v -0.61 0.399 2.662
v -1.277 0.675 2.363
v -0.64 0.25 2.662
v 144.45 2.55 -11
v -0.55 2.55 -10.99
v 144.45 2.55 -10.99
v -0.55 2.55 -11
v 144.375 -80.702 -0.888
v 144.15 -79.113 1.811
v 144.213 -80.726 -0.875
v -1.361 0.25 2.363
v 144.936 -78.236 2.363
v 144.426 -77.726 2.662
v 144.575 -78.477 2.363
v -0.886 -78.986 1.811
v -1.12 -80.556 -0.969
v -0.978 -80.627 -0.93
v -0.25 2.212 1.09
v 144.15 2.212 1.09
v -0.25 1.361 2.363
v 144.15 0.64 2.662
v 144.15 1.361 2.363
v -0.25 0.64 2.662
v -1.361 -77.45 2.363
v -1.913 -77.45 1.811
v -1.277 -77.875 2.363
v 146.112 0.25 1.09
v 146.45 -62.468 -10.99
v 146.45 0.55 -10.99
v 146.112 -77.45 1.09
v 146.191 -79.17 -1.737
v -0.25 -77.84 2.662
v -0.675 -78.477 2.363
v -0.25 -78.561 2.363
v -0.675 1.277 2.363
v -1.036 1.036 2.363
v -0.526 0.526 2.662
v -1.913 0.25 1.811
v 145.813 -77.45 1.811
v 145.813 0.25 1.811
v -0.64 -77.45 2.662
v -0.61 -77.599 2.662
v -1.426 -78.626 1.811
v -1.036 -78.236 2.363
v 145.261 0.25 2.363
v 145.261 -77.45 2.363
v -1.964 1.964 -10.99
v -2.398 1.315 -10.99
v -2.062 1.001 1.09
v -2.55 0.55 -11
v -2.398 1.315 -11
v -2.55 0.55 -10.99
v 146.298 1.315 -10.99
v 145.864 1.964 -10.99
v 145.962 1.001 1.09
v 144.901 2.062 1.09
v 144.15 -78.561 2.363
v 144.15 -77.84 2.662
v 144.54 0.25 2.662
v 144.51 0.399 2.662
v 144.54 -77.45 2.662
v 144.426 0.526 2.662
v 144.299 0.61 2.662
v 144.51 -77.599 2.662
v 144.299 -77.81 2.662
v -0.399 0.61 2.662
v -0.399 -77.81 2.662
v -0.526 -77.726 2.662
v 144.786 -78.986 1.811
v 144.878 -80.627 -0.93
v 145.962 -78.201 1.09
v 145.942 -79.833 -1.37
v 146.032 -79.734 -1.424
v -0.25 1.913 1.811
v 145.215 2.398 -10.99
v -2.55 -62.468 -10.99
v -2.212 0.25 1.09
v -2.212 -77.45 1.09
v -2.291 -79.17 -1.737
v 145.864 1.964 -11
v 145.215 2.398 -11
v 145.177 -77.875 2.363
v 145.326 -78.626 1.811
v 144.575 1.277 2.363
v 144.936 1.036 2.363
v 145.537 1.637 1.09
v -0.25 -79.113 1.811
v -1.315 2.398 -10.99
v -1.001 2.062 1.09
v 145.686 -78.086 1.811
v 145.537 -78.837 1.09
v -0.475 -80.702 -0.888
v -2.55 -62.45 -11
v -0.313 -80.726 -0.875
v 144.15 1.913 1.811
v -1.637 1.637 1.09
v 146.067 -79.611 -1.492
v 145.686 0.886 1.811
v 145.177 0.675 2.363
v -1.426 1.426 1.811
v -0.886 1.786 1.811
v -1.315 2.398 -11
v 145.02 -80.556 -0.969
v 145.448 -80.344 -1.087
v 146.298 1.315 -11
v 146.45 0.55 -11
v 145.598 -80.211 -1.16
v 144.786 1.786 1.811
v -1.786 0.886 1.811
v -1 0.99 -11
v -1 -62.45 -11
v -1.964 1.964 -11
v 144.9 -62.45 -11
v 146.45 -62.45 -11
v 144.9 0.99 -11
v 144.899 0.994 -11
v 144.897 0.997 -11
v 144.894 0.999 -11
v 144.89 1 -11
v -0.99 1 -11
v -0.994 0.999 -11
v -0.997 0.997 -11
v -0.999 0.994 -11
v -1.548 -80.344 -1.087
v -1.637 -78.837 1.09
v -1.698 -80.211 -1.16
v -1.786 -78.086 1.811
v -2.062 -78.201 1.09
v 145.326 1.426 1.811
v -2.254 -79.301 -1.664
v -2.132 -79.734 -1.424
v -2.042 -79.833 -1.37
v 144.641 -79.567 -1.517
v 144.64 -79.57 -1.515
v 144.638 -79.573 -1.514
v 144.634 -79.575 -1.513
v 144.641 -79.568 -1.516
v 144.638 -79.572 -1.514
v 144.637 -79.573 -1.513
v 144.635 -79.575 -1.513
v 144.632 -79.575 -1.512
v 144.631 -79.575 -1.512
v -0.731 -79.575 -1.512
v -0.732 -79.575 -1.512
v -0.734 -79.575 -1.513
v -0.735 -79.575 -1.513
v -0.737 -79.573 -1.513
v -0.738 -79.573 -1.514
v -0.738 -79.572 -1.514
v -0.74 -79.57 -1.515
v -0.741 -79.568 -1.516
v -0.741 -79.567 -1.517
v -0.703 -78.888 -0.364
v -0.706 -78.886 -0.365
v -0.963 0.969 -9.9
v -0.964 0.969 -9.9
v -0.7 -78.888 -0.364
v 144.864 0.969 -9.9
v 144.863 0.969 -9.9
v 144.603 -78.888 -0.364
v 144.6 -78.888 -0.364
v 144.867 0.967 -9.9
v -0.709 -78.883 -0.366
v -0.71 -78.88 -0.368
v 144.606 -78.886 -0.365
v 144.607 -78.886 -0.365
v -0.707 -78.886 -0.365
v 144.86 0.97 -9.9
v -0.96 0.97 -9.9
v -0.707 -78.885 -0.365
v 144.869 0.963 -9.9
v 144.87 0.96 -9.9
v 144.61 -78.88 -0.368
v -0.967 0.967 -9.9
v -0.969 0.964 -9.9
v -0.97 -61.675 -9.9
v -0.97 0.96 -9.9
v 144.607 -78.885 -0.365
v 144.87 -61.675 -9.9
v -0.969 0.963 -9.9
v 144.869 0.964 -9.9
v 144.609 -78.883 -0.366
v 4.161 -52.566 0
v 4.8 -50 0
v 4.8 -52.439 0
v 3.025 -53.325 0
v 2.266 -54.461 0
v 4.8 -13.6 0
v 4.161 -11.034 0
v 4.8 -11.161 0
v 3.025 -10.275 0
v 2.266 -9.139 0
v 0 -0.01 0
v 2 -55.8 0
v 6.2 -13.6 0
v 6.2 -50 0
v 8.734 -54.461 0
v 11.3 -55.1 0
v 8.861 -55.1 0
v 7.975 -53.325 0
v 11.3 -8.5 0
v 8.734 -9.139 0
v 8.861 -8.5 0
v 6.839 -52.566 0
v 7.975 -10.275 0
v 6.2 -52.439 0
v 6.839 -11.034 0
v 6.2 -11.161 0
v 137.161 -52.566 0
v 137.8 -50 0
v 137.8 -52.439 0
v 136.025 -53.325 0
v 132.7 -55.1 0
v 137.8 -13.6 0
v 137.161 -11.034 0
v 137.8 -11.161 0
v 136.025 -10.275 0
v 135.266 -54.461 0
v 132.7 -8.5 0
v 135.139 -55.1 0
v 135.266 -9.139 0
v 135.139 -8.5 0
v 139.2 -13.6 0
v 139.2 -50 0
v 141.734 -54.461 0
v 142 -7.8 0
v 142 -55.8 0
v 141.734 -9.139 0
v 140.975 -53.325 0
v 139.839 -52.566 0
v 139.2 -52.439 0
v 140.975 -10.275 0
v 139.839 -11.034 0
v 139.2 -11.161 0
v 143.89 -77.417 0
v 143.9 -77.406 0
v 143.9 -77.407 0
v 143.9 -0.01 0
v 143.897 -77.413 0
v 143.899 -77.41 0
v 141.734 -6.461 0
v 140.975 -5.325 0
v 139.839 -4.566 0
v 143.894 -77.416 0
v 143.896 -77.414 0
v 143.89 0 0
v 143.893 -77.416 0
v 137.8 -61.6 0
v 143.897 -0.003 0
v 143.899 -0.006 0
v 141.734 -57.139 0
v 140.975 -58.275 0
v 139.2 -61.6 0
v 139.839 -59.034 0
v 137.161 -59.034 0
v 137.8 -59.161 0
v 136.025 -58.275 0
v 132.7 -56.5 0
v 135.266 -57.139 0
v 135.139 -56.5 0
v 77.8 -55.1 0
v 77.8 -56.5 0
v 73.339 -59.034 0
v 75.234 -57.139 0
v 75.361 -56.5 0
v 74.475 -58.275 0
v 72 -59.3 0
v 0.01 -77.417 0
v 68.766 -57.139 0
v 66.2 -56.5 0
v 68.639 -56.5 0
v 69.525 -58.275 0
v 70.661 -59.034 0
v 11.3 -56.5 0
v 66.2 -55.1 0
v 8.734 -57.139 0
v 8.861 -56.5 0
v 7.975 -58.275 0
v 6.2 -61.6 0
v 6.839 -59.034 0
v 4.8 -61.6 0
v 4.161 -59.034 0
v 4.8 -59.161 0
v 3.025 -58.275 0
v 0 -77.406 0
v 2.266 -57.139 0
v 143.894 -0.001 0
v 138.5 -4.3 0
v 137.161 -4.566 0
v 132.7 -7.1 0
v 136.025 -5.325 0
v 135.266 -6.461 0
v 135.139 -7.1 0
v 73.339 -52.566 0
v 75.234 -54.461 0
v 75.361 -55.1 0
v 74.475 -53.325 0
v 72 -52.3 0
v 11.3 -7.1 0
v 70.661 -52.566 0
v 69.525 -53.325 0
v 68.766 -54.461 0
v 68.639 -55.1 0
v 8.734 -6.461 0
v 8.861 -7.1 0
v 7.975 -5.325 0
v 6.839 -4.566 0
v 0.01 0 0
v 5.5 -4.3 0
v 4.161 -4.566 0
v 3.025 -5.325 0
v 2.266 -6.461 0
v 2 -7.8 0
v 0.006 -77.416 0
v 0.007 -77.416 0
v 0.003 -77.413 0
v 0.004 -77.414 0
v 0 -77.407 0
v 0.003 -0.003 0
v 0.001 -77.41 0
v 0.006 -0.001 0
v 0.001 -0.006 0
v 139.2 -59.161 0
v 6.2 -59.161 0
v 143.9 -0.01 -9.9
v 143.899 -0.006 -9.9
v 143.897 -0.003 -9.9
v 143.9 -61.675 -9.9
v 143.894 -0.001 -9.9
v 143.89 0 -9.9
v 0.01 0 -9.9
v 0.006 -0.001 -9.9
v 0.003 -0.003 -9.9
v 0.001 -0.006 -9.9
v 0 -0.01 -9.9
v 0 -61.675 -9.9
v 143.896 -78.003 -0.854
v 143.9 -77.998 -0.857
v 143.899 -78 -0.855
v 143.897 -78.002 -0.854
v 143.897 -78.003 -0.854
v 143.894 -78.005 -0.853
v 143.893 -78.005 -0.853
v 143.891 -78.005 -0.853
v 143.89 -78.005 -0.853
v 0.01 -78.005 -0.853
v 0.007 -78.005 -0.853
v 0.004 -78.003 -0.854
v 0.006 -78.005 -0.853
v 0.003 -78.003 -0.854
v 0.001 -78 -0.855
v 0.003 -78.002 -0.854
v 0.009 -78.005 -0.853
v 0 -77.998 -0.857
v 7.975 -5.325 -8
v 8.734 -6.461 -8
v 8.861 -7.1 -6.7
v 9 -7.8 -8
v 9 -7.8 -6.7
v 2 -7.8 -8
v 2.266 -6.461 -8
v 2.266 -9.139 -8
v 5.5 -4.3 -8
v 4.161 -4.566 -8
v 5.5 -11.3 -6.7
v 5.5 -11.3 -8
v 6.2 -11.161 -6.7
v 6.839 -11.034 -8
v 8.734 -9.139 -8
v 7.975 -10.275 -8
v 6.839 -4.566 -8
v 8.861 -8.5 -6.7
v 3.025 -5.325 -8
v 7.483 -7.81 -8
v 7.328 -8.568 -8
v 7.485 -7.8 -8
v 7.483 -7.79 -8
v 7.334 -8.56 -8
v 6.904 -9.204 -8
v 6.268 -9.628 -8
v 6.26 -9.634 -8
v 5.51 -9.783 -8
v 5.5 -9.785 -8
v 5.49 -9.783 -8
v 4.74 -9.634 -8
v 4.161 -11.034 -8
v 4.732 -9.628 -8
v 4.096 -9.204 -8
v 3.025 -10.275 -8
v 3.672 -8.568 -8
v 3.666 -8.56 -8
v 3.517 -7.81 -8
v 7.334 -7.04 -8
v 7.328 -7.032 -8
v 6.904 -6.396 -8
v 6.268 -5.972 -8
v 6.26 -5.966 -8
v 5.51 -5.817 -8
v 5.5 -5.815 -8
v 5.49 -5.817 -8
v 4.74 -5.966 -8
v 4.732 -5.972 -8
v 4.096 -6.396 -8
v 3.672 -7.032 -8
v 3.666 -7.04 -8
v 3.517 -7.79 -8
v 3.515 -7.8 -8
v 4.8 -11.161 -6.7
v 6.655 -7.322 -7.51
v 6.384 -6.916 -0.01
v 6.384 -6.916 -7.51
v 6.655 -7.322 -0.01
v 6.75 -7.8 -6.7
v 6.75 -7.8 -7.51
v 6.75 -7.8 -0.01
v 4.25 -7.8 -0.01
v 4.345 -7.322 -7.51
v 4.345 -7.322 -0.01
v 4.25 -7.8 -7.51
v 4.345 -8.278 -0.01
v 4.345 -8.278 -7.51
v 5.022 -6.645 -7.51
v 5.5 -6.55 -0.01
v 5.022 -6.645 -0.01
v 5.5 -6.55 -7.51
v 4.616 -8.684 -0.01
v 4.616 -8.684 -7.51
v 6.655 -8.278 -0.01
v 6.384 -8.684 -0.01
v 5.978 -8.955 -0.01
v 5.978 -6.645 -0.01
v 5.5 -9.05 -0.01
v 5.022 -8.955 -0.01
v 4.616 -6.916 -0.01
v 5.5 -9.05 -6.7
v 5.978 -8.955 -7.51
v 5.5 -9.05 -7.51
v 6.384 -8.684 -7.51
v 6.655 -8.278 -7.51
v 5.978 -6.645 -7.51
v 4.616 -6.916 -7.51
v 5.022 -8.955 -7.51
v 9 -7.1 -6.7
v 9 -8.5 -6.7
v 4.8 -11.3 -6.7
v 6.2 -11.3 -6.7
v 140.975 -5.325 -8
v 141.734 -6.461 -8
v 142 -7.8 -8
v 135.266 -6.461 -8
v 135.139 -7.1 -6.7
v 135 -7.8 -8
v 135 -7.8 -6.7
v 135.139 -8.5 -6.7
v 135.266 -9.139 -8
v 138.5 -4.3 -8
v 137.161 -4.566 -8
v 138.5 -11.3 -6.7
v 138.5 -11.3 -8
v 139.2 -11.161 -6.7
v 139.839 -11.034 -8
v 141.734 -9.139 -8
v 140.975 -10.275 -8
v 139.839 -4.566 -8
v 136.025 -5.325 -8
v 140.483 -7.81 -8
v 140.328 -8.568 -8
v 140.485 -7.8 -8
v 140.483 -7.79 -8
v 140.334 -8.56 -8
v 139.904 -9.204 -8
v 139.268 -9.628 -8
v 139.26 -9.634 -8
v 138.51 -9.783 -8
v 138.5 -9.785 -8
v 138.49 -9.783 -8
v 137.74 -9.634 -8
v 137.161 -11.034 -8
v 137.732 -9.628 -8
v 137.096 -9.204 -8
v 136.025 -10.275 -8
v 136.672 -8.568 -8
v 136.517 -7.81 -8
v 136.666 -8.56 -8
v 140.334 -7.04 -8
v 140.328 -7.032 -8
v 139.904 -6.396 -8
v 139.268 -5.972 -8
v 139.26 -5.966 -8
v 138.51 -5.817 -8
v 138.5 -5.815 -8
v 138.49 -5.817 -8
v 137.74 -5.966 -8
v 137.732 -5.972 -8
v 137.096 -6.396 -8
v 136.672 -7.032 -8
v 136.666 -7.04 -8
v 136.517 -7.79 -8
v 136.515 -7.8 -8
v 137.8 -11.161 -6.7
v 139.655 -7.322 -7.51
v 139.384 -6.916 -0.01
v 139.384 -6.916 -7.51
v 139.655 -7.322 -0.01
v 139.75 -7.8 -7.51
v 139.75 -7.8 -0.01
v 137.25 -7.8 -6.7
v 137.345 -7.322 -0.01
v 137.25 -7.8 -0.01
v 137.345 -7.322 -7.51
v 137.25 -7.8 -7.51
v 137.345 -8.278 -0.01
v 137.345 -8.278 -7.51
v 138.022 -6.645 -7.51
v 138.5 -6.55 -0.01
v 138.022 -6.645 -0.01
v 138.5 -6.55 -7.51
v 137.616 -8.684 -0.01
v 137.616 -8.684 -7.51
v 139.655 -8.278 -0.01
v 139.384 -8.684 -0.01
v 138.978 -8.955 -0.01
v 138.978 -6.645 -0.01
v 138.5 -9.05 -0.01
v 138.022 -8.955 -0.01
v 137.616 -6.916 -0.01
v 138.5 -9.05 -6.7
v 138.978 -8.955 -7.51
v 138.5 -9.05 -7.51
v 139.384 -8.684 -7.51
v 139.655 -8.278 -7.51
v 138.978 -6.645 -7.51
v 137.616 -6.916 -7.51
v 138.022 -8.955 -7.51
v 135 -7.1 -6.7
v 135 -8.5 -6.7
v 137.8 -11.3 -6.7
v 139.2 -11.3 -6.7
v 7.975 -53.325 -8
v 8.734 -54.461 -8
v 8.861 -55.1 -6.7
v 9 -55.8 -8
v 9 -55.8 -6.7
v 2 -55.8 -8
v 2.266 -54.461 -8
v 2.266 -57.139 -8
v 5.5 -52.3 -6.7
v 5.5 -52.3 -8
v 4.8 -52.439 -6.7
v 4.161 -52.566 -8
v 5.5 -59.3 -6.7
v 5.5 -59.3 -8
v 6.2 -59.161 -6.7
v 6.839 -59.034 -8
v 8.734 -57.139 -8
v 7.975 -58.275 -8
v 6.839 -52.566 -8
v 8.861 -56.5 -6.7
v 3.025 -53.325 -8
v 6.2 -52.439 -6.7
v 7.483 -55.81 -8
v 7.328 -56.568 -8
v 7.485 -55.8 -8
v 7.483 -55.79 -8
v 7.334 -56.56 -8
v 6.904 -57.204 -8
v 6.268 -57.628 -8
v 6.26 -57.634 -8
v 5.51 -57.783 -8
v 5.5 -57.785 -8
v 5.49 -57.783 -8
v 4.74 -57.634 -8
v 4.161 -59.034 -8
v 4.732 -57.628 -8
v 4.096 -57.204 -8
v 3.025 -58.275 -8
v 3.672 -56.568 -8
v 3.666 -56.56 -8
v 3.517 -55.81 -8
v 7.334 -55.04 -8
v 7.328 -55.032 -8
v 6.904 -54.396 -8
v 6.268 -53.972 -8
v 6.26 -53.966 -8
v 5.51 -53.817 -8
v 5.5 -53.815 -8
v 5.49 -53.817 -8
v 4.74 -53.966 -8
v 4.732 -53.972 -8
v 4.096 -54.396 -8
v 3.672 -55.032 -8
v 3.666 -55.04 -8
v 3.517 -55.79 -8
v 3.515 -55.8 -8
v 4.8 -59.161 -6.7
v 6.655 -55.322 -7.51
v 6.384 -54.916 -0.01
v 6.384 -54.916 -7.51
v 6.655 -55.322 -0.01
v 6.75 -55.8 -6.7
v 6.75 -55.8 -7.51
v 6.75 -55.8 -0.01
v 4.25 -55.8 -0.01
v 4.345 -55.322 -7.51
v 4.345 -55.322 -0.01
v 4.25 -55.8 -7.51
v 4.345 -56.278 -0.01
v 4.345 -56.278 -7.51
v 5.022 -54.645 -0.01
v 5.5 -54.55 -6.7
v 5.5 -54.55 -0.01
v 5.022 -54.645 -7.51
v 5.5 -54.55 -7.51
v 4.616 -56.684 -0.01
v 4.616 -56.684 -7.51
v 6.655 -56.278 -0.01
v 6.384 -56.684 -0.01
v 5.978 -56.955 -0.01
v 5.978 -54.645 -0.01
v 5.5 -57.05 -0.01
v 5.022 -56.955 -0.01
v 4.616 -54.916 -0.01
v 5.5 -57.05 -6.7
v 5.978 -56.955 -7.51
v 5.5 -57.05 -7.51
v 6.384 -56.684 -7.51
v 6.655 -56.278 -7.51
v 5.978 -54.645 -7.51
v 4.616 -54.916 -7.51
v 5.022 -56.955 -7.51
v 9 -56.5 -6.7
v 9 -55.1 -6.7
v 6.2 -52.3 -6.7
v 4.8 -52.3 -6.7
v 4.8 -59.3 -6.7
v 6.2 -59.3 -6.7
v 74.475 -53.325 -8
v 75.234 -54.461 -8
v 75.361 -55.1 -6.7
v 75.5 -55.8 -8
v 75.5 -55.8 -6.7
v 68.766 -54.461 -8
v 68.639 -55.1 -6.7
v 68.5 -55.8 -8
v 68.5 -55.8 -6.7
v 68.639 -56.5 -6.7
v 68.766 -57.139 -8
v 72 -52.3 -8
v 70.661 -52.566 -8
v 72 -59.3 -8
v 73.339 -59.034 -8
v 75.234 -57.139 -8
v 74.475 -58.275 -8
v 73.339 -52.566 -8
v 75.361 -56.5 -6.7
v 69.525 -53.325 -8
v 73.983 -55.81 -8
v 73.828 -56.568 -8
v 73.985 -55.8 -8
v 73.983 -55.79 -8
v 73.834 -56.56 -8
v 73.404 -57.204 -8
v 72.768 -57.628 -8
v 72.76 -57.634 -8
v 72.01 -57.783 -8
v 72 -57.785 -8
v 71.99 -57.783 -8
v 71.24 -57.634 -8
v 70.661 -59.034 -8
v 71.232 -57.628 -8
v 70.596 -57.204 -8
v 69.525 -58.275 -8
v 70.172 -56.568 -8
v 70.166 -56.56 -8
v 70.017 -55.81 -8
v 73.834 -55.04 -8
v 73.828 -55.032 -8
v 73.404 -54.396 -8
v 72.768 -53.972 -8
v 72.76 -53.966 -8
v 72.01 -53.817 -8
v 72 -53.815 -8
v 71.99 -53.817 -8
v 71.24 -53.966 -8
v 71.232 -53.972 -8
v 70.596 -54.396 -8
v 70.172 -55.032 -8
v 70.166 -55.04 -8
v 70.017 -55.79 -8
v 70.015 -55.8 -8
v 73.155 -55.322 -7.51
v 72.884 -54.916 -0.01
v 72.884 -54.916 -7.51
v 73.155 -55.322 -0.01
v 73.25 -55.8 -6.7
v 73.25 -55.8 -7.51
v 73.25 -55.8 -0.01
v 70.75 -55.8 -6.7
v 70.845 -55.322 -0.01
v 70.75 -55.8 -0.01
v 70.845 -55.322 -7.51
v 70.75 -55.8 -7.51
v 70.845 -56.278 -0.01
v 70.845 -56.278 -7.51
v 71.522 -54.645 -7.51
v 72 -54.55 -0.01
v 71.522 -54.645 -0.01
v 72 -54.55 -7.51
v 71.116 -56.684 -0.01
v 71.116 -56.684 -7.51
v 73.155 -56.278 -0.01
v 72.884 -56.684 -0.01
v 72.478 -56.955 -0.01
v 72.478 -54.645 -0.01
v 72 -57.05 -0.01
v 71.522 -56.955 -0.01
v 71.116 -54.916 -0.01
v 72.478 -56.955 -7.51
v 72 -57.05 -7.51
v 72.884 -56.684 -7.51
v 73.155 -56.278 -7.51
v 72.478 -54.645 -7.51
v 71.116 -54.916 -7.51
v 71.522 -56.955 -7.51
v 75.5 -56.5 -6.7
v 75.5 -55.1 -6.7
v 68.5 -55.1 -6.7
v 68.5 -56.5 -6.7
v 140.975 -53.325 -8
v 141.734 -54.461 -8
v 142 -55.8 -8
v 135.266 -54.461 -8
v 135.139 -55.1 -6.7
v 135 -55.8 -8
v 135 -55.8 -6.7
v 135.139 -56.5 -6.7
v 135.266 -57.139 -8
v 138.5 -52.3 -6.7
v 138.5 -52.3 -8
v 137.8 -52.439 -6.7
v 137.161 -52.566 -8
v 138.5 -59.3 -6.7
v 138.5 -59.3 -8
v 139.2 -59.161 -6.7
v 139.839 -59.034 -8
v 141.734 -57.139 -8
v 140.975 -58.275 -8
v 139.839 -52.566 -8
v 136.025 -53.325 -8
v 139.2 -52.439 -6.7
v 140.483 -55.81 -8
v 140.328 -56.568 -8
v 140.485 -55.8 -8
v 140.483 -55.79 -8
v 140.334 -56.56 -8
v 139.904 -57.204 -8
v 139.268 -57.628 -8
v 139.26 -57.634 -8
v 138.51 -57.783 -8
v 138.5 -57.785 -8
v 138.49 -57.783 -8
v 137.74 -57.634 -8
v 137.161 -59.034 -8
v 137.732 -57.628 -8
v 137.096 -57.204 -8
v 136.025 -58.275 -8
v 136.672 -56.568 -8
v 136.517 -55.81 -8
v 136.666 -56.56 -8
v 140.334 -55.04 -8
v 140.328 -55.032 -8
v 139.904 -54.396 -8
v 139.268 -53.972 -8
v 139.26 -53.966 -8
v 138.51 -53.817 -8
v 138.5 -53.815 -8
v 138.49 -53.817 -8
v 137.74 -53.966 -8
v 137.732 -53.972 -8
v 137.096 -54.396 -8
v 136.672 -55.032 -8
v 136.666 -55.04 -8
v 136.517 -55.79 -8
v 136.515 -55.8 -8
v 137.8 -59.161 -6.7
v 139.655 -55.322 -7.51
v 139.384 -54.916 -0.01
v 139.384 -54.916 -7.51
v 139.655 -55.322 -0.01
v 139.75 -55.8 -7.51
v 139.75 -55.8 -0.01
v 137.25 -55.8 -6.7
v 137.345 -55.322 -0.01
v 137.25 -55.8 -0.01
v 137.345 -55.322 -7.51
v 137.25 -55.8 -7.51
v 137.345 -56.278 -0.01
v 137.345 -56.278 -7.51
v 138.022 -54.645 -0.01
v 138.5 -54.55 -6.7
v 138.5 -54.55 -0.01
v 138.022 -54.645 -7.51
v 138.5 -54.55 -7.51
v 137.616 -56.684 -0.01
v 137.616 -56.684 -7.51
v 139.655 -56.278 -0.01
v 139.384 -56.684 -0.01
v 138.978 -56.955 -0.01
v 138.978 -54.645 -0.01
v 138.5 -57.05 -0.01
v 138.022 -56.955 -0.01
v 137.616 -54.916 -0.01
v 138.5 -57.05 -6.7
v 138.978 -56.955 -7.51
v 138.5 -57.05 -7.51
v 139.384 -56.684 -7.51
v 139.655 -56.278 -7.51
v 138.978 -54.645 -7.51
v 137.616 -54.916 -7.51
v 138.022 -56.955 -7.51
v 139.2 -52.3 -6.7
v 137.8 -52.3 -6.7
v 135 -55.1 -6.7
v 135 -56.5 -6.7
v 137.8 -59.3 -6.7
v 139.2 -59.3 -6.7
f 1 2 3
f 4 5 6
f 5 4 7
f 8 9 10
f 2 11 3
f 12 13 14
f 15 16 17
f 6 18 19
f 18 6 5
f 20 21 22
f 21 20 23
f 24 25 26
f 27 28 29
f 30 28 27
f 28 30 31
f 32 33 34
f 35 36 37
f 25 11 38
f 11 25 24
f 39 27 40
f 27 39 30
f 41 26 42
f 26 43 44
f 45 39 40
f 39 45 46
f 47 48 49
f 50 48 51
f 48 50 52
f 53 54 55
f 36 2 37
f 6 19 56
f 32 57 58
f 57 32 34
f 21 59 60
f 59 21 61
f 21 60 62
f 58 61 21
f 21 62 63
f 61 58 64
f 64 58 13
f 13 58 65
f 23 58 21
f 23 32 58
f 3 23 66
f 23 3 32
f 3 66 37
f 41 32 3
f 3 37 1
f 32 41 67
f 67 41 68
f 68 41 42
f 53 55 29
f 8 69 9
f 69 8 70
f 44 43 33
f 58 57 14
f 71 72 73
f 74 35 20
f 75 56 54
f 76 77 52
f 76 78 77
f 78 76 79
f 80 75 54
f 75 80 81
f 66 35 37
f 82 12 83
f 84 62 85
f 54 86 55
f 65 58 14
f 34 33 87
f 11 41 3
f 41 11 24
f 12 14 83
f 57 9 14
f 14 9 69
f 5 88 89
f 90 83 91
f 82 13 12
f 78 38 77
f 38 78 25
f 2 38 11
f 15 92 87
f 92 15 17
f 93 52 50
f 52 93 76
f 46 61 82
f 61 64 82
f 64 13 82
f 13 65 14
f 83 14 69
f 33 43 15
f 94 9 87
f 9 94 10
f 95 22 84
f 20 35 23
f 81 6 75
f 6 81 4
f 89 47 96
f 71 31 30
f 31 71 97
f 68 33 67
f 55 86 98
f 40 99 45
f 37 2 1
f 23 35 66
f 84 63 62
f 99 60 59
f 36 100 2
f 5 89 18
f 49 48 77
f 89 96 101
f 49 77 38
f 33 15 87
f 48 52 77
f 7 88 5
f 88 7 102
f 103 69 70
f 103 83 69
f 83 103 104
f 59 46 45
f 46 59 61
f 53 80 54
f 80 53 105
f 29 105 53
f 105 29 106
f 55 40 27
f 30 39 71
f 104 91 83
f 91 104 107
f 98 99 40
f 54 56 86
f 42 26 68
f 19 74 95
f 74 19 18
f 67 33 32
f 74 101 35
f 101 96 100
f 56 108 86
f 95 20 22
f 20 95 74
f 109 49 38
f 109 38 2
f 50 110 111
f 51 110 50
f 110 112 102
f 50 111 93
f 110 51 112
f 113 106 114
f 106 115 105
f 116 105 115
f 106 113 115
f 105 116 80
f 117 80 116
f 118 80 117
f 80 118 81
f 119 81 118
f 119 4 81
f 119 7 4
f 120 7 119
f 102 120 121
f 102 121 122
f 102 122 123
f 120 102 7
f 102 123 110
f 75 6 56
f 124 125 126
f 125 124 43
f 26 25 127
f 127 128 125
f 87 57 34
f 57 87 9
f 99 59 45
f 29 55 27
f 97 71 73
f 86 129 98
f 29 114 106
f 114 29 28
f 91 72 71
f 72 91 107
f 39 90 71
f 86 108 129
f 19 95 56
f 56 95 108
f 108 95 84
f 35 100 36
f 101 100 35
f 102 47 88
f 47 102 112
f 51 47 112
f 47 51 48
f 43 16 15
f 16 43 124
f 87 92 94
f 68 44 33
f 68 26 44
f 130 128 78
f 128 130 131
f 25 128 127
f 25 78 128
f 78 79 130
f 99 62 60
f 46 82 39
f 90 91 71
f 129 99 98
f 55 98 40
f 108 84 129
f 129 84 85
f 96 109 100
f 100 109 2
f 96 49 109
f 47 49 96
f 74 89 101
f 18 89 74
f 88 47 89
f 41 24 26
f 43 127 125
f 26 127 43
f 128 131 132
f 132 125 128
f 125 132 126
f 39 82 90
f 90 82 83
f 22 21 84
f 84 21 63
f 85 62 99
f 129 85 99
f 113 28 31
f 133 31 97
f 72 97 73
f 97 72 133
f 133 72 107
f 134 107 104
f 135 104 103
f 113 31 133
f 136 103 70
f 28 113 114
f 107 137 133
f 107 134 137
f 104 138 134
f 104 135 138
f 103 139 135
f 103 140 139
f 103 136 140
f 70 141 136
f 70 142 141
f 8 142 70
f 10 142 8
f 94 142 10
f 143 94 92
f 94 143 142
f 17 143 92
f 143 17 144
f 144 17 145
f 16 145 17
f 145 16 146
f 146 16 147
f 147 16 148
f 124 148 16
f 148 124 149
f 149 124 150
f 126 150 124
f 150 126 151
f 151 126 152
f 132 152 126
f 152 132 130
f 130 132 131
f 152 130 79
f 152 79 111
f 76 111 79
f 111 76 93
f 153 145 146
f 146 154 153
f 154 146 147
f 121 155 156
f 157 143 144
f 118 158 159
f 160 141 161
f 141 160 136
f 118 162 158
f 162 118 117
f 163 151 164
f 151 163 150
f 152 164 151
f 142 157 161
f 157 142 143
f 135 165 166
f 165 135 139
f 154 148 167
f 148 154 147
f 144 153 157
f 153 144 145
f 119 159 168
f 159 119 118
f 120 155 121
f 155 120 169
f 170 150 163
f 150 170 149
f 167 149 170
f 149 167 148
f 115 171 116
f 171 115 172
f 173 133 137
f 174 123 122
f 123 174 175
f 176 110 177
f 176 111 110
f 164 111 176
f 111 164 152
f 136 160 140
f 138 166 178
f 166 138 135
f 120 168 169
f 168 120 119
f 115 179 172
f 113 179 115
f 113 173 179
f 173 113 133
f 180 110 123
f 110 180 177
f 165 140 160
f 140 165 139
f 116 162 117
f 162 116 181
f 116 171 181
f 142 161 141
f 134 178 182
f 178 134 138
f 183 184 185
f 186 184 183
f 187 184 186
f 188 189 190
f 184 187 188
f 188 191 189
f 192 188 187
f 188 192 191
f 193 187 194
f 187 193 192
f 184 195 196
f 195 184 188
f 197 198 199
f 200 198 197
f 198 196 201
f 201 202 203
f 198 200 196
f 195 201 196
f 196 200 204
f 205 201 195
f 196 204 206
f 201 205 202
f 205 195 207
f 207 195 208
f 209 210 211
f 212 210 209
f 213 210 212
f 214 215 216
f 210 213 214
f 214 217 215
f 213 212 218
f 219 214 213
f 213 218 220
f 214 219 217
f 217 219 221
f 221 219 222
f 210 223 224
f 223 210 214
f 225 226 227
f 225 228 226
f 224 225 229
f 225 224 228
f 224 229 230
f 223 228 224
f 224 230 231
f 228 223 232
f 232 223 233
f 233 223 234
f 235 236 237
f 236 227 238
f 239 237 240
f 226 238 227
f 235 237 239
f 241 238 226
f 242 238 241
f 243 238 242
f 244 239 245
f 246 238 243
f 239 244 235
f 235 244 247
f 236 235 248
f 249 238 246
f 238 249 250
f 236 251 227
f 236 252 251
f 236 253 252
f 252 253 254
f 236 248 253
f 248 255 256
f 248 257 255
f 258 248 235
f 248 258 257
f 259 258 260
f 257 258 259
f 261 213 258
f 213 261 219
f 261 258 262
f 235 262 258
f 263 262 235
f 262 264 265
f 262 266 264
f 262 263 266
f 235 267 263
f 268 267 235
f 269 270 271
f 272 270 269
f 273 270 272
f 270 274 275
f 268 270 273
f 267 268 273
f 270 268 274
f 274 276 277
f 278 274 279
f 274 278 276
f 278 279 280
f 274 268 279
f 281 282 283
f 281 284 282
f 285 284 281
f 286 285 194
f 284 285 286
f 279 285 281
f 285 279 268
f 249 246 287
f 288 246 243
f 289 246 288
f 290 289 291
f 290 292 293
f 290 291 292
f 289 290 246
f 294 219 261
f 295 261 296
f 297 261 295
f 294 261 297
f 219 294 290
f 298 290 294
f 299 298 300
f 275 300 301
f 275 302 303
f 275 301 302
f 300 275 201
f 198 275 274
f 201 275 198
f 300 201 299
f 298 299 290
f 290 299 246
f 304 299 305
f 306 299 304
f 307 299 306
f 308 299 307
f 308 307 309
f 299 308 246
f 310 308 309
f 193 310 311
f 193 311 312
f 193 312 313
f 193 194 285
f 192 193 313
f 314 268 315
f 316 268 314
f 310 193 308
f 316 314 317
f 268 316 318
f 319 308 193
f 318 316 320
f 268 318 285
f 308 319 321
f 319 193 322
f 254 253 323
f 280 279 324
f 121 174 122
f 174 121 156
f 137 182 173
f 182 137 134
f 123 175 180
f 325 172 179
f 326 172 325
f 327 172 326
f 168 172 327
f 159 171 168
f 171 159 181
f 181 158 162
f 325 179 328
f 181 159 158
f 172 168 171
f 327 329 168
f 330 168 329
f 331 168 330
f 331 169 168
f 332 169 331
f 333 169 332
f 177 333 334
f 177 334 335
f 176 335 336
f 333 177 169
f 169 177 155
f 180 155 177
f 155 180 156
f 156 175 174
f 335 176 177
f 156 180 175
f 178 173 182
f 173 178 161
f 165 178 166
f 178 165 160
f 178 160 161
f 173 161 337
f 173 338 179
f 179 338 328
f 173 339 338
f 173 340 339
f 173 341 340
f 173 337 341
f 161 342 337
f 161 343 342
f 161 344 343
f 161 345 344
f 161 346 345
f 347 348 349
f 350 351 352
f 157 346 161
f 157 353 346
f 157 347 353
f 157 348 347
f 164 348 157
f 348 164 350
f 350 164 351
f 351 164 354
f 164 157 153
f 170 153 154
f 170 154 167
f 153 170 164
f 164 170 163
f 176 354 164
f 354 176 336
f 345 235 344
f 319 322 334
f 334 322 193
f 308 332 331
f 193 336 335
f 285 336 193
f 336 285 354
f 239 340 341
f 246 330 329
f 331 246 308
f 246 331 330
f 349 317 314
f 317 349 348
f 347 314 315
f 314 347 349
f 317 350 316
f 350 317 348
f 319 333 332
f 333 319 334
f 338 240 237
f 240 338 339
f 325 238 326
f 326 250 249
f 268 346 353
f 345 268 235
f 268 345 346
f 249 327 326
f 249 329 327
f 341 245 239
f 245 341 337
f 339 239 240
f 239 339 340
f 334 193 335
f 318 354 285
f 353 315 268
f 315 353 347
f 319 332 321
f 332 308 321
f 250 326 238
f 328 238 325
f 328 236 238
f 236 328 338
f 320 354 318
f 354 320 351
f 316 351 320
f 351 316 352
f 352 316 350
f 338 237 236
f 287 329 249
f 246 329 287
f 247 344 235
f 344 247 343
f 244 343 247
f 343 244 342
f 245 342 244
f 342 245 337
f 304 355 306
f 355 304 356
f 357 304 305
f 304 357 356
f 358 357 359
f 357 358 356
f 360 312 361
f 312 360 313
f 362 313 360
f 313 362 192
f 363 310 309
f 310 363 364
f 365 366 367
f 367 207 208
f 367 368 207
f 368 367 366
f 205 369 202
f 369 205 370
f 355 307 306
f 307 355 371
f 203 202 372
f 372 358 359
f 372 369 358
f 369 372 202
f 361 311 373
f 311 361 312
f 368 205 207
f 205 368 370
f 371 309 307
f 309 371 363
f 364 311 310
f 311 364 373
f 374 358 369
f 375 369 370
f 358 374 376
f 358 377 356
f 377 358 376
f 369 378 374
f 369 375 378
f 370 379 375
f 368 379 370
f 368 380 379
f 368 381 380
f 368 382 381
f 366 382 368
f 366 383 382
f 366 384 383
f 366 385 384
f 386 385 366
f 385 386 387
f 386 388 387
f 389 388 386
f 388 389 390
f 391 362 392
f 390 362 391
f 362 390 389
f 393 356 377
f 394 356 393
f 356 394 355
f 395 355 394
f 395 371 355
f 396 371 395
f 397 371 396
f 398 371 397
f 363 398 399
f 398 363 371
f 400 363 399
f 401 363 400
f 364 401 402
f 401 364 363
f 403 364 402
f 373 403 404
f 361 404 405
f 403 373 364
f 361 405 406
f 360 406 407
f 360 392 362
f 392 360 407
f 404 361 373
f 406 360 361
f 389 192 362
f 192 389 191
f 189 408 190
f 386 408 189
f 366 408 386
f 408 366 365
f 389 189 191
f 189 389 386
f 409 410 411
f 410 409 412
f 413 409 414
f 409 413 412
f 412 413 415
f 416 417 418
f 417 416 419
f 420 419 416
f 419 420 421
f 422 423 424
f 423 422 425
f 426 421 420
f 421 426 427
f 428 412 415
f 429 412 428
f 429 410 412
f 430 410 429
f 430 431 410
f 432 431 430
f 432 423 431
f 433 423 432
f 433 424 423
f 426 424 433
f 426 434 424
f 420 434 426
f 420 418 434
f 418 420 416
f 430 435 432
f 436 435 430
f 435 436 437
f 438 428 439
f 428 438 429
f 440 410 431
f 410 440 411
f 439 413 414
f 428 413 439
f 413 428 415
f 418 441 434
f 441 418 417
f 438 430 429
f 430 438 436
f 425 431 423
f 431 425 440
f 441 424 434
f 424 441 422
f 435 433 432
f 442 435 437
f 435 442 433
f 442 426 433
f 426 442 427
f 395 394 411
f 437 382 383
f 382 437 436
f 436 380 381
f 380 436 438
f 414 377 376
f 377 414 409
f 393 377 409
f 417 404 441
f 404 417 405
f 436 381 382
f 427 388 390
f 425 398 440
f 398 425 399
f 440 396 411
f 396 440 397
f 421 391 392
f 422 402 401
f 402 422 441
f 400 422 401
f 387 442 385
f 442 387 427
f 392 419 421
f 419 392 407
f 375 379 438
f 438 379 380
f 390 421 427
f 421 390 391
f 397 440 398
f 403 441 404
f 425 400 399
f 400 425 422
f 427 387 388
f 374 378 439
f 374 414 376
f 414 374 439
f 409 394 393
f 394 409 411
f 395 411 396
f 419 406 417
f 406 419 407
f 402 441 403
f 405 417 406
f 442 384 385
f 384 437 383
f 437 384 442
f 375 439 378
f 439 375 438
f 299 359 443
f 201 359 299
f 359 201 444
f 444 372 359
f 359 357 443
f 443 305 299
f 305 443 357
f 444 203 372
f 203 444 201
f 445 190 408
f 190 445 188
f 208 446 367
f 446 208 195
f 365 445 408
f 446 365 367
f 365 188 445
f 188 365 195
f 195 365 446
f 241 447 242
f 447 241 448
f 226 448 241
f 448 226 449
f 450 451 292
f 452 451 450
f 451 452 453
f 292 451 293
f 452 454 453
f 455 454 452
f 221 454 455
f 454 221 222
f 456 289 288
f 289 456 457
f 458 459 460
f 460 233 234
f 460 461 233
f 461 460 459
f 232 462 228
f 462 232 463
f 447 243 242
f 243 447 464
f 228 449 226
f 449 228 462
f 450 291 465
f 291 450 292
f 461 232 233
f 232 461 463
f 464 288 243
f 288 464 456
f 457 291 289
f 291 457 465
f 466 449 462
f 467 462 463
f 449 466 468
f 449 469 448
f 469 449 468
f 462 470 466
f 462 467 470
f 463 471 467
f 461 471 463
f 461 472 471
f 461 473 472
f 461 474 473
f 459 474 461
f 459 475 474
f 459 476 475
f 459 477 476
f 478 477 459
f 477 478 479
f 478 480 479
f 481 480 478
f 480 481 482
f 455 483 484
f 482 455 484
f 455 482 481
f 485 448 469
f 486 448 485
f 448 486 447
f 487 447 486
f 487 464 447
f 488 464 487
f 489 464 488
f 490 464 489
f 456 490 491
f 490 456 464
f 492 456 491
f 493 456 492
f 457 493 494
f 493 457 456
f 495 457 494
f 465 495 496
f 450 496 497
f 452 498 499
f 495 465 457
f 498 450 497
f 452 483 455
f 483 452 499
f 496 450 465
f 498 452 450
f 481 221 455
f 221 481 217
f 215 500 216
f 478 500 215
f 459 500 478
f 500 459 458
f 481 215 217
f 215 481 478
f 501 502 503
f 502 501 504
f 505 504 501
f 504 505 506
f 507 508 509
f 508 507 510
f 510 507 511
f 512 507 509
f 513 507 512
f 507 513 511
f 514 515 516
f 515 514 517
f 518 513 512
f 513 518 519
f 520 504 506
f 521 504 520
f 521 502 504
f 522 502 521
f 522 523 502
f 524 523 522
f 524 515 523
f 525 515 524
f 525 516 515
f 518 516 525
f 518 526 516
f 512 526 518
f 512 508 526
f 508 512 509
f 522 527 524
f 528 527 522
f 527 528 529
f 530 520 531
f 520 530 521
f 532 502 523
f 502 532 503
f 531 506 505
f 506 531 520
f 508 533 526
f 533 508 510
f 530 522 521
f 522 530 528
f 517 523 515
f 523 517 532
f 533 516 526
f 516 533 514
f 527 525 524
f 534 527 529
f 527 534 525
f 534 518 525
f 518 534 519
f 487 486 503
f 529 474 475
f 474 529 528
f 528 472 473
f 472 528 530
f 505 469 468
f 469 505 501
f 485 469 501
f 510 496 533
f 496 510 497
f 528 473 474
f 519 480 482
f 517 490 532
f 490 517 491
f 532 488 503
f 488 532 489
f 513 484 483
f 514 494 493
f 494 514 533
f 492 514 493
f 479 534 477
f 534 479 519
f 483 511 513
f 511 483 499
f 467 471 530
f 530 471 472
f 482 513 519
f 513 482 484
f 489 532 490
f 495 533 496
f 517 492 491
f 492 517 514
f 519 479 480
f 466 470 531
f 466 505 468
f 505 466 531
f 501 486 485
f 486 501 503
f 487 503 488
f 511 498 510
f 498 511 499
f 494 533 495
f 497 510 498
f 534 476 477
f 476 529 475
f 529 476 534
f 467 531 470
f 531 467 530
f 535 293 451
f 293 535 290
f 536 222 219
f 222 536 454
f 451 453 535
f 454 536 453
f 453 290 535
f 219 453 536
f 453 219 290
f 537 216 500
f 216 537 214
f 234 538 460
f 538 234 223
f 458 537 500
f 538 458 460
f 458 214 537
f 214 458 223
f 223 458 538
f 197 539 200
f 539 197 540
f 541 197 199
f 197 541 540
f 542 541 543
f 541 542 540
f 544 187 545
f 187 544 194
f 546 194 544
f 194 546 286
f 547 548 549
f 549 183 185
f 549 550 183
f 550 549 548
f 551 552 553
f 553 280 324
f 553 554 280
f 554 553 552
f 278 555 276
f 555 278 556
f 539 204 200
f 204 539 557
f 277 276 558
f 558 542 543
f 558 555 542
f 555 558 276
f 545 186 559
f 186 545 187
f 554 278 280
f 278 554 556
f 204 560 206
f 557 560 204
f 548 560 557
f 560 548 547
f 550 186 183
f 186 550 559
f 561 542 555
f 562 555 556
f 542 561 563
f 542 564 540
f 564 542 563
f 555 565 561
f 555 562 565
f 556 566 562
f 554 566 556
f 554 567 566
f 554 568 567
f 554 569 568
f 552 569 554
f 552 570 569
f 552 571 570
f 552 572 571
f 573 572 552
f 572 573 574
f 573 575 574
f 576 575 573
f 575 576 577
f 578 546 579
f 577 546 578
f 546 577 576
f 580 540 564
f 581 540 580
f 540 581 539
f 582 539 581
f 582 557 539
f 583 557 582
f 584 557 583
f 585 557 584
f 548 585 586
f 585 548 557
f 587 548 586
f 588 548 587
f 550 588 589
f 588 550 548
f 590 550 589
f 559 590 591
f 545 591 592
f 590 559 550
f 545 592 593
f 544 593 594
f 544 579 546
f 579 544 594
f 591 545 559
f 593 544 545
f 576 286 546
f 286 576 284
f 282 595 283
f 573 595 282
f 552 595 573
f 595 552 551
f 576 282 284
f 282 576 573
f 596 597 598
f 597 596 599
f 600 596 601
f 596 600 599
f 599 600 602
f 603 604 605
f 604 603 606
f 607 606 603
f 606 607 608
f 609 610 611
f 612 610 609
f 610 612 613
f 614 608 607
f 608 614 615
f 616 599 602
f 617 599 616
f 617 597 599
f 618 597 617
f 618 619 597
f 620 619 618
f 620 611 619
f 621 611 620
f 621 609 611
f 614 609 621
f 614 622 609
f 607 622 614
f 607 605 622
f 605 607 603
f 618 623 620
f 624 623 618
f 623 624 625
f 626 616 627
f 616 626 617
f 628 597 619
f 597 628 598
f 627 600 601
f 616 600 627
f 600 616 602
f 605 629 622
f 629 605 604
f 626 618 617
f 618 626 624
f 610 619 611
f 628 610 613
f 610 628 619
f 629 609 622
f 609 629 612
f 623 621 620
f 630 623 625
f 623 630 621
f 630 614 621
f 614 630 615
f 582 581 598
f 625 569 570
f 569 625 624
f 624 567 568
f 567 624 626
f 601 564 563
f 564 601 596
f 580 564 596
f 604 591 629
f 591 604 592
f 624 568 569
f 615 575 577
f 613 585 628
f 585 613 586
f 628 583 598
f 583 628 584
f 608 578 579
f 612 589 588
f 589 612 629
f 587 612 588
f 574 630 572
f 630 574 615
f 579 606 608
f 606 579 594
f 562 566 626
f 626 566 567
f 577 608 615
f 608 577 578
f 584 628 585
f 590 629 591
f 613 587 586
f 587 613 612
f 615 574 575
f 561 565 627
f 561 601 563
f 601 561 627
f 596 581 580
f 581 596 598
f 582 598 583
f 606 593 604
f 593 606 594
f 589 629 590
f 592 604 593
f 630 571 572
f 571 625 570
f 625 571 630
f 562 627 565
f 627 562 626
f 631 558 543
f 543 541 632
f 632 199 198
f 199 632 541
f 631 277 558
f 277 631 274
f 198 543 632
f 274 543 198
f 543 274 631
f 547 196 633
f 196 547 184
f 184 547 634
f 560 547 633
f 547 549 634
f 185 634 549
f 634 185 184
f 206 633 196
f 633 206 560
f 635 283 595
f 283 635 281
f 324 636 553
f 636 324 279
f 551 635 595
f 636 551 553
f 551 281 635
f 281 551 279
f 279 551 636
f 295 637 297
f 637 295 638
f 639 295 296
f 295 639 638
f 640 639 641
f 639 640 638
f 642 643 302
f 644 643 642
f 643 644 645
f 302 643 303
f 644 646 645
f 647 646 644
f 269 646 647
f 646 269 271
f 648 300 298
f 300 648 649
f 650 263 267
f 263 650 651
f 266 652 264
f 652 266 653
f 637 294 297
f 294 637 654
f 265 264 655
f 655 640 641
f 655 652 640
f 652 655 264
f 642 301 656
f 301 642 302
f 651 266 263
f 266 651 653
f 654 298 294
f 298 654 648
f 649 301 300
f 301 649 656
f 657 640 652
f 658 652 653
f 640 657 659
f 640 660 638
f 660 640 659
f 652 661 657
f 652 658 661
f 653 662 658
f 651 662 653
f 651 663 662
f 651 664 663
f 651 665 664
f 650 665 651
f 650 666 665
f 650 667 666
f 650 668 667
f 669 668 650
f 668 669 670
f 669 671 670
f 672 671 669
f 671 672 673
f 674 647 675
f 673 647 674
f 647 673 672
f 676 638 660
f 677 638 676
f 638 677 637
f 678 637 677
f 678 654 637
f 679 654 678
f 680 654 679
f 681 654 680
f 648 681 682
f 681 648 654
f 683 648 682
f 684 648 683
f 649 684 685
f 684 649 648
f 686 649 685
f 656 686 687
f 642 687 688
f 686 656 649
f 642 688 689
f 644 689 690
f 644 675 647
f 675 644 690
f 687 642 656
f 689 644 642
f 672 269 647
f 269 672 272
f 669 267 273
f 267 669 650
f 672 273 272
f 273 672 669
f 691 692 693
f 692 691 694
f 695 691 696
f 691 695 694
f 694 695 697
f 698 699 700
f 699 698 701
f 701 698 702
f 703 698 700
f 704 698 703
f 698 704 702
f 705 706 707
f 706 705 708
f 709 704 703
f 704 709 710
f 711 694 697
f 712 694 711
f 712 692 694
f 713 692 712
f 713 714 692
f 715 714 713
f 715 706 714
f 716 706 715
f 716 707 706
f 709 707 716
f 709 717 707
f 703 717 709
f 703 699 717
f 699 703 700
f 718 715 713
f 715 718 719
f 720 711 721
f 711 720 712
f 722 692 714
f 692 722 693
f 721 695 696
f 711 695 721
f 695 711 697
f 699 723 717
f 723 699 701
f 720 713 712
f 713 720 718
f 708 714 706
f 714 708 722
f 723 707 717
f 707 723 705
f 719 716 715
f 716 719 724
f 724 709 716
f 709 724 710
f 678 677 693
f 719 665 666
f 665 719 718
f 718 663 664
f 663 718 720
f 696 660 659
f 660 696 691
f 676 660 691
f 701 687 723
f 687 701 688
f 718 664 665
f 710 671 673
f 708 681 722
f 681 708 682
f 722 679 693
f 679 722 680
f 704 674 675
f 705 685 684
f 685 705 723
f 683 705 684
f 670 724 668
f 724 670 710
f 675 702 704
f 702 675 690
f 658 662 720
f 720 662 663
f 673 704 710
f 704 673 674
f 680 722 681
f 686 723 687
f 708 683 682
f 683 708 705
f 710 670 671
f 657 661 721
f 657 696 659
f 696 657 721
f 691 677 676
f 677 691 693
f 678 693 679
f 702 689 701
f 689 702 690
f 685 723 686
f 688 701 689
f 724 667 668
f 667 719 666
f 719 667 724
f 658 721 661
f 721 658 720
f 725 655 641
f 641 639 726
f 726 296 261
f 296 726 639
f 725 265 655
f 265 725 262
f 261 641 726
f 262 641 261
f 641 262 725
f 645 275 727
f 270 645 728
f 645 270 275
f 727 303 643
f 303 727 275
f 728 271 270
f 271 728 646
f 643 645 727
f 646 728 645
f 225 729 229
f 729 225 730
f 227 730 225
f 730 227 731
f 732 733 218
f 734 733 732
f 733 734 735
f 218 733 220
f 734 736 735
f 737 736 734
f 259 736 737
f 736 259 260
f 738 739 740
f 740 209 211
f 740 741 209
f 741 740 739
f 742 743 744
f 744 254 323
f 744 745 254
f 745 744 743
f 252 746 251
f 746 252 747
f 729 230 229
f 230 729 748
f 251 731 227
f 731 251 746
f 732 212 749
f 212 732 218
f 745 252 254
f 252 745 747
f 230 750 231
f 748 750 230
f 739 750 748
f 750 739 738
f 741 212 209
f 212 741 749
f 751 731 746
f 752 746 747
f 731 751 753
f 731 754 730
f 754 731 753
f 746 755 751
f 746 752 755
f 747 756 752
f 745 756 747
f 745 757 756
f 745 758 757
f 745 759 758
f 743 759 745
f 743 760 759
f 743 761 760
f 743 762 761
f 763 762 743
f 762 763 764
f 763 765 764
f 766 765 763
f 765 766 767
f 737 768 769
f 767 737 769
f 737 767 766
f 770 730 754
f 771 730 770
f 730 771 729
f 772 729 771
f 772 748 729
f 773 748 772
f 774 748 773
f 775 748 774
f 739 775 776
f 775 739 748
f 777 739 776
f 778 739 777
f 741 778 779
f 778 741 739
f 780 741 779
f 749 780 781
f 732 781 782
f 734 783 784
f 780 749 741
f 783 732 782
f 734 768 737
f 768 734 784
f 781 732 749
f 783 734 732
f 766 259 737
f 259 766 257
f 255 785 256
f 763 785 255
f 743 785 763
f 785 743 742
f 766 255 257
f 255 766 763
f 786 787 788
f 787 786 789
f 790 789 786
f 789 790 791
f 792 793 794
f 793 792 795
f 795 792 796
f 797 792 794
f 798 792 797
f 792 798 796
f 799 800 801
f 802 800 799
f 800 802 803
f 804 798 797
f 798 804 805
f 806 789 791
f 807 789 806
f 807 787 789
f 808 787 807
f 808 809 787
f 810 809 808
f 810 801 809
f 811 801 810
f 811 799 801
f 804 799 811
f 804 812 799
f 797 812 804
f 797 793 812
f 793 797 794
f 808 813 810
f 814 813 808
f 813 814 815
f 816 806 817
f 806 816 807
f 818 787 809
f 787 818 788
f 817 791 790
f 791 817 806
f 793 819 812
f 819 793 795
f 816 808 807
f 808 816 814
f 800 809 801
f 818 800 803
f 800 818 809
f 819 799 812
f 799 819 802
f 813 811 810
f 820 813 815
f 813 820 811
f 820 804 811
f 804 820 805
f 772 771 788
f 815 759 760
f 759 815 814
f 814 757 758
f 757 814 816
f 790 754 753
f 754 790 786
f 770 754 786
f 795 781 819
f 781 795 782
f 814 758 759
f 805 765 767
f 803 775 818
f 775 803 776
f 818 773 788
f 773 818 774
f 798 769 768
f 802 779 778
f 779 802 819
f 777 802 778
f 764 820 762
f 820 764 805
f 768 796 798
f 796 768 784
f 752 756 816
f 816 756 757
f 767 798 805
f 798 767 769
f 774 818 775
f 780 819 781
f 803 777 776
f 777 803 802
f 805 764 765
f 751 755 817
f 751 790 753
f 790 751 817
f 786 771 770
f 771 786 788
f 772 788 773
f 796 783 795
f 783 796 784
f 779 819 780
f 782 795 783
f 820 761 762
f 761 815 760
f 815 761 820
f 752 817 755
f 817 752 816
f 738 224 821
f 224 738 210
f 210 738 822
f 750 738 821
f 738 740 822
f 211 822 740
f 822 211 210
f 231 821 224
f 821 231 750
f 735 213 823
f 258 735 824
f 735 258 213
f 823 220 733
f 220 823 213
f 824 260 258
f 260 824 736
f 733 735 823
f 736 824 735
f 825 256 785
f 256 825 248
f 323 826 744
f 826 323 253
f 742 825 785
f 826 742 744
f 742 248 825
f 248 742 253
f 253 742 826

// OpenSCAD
/*
 * Front face for NES four score
 */

$fn = 16;

/*
 * Flat pill-shape with rounded top edge
 */
module pill_fillet_end(diameter, height, rounding) {
  r = diameter/2;
  cx = r - rounding;
  cy = height - rounding;


  rotate([0, 0, -90]) {
    rotate_extrude(angle=180) {

      // Rectangle with a single rounded corner
      square(size=[r, cy]);

      if (rounding > 0) {
        square(size=[cx, height]);
        translate([cx, cy, 0])
          rotate([0,0,45])
            circle(r=rounding);
      }
    };
  };
}

module flat_rounded_pill(length, diameter, height, rounding) {
  // Distance from the middle to the center of the round cap
  mid = (length/2) - (diameter/2);
  hull() {
    translate([mid,0,0])
      pill_fillet_end(diameter, height, rounding);
    translate([-mid,0,0])
      rotate([0,0,180])
        pill_fillet_end(diameter, height, rounding);
  }
}


/*
 * Rectangle with rounded corners, not centered
 */
module rounded_rect(w,h,r) {
  x0 = r;
  y0 = r;
  x1 = w - r;
  y1 = h - r;

  hull() {
    translate([x0, y0])
      circle(r=r);
    translate([x0, y1])
      circle(r=r);
    translate([x1, y1])
      circle(r=r);
    translate([x1, y0])
      circle(r=r);
  }
}


module rounded_3_corner(r) {
  intersection() {
    sphere(r=r);
    cube(r);
  }
}

// Cuboid with rounded top edges and corners,
// with its top on the XY plane
module rounded_rect_top(w,h,r) {
  x0 = r;
  y0 = r;
  z0 = -r;

  x1 = w - r;
  y1 = h - r;

  hull() {
    translate([x1, y1, z0])
      rounded_3_corner(r);

    translate([x0, y1, z0])
    rotate([0,0,90]) rounded_3_corner(r);

    translate([x0, y0, z0])
    rotate([0,0,180]) rounded_3_corner(r);

    translate([x1, y0, z0])
    rotate([0,0,270]) rounded_3_corner(r);
  }
}


body_short_edge = 65;
floor_angle = asin(31.5/body_short_edge);   // Measured under the short edge of the back


// The general wedgy shape of the main body
module body_shape(back_width, back_height, back_short_edge,
                  face_width, face_height,
                  depth, rounding) {

  // Difference between back and front, gives a slight chamfer to the sides.
  face_offset = (back_width - face_width)/2;

  difference() {
    // The extreme extents of the body, with the back extended
    hull() {
      // The open (back) surface
      linear_extrude(0.01) {
        rounded_rect(back_width, back_height, rounding);
      }

      // The front face, which is slightly smaller
      translate([face_offset, (back_height - face_height - face_offset), depth])
        rounded_rect_top(face_width, face_height, rounding);
    }

    // The angular cutout toward the "floor"
    translate([-0.5, back_height - back_short_edge, 0])
      rotate([90-floor_angle,0,0])
        mirror([0,1,0]) cube([back_width + 1, 20, 3*depth]);
  }
}

//
// Hollowed-out body without other features
// Origin is at the upper-left corner (inside)
//

module hollow_body() {

  body_w = 149;
  body_d = 13.7;
  body_rounding = 2;

  body_floor_edge = 21.3;
  body_short_ext = (body_floor_edge / cos(floor_angle));   // Assuming that the front lip has a 90 degree angle to the floor
  body_h = body_short_edge + body_short_ext;

  front_w = 148.4;
  front_h = 81.7;

  outer_thickness = 1.55;
  inner_d = 11;

  inner_lip_w = 1;
  inner_lip_d = 1.1;

  t = outer_thickness;
  l = outer_thickness + inner_lip_w;

  translate([-l, -(body_h -l), -inner_d]) {

    // Outer shell/lip
    difference() {
      // Outer shape
      body_shape(body_w, body_h, body_short_edge,
                 front_w, front_h,
                 body_d, body_rounding);

      // Hollow out to give the outer lip
      translate([t, t, -0.01])
        body_shape(body_w - (2*t), body_h - (2*t), body_short_edge,
                   front_w - (2*t), front_h - (t*1.5),
                   inner_d+0.01, 0.01);
    }

    // Inner lip
    difference() {
      translate([t, t, inner_lip_d])
        body_shape(body_w - (2*t), body_h - (2*t), body_short_edge - (t*1.5),
                   body_w - (2*t), front_h - (t*1.5),
                   inner_d, 0.01);

      translate([l, l, inner_lip_d-0.01])
        body_shape(body_w - (2*(l)), body_h - (2*(l)), body_short_edge - (t*1.5),
                   body_w - (2*(l)), front_h - (2*(l)),
                   inner_d+0.1, 0.01);
    }
  }
}



//
// Screw posts inside the case
//
post_o = 7;
post_i = 2.5;
post_h = 8;
post_sink_d = 4;
post_sink_s = 0.5;
module screw_post() {
  translate([0, 0, (-post_h/2)])
    difference() {
      cylinder(d=post_o, h=post_h, center=true);
      translate([0, 0, -0.01])
        cylinder(d=post_i, h=post_h, center=true);
      translate([0, 0, -(post_h - post_sink_s)/2 - 0.01 ])
        cylinder(d1=post_sink_d, d2=post_i, h=post_sink_s, center=true);
    }
}

module screw_post_strut_3(rot) {
  width = 2.3;
  height = 6.7;
  thickness= 1.4;

  // Extra width to make sure it intersects the post,
  // but doesn't interfere with the screw hole
  i = (post_o - post_i) / 2;
  //i=0;
  rotate([0, 0, rot])
    translate([post_o/2 - i, 0, 0])
      rotate([-90, 0, 0])
      linear_extrude(thickness, center=true)
        polygon(points = [ [ 0, 0 ], [width+i, 0], [i, height], [0, height] ]);

}

// Origin at the inside of the upper-left corner (above the selector switch)
module screw_posts() {
  // The case screw posts are in two rows, three columns.
  // All measurements are to outer edge of posts
  c_r_1 = 4.3 + (post_o/2);
  c_r_2 = 52.3 + (post_o/2);
  c_c_1 = 2 + (post_o/2);
  c_c_2 = 68.5 + (post_o/2);
  c_c_3 = 135 + (post_o/2);

  translate([c_c_1, -c_r_1, 0]) {
    screw_post();
    screw_post_strut_3(0);
    screw_post_strut_3(270);
  }

  translate([c_c_3, -c_r_1, 0]) {
    screw_post();
    screw_post_strut_3(180);
    screw_post_strut_3(270);
  }

  translate([c_c_1, -c_r_2, 0]) {
    screw_post();
    screw_post_strut_3(0);
    screw_post_strut_3(90);
    screw_post_strut_3(270);
  }

  translate([c_c_2, -c_r_2, 0]) {
    screw_post();
    screw_post_strut_3(0);
    screw_post_strut_3(180);
  }

  translate([c_c_3, -c_r_2, 0]) {
    screw_post();
    screw_post_strut_3(90);
    screw_post_strut_3(180);
    screw_post_strut_3(270);
  }

}

// Top-level module
module casing_front() {
  hollow_body();
  //translate([i
  screw_posts();
}



casing_front();
